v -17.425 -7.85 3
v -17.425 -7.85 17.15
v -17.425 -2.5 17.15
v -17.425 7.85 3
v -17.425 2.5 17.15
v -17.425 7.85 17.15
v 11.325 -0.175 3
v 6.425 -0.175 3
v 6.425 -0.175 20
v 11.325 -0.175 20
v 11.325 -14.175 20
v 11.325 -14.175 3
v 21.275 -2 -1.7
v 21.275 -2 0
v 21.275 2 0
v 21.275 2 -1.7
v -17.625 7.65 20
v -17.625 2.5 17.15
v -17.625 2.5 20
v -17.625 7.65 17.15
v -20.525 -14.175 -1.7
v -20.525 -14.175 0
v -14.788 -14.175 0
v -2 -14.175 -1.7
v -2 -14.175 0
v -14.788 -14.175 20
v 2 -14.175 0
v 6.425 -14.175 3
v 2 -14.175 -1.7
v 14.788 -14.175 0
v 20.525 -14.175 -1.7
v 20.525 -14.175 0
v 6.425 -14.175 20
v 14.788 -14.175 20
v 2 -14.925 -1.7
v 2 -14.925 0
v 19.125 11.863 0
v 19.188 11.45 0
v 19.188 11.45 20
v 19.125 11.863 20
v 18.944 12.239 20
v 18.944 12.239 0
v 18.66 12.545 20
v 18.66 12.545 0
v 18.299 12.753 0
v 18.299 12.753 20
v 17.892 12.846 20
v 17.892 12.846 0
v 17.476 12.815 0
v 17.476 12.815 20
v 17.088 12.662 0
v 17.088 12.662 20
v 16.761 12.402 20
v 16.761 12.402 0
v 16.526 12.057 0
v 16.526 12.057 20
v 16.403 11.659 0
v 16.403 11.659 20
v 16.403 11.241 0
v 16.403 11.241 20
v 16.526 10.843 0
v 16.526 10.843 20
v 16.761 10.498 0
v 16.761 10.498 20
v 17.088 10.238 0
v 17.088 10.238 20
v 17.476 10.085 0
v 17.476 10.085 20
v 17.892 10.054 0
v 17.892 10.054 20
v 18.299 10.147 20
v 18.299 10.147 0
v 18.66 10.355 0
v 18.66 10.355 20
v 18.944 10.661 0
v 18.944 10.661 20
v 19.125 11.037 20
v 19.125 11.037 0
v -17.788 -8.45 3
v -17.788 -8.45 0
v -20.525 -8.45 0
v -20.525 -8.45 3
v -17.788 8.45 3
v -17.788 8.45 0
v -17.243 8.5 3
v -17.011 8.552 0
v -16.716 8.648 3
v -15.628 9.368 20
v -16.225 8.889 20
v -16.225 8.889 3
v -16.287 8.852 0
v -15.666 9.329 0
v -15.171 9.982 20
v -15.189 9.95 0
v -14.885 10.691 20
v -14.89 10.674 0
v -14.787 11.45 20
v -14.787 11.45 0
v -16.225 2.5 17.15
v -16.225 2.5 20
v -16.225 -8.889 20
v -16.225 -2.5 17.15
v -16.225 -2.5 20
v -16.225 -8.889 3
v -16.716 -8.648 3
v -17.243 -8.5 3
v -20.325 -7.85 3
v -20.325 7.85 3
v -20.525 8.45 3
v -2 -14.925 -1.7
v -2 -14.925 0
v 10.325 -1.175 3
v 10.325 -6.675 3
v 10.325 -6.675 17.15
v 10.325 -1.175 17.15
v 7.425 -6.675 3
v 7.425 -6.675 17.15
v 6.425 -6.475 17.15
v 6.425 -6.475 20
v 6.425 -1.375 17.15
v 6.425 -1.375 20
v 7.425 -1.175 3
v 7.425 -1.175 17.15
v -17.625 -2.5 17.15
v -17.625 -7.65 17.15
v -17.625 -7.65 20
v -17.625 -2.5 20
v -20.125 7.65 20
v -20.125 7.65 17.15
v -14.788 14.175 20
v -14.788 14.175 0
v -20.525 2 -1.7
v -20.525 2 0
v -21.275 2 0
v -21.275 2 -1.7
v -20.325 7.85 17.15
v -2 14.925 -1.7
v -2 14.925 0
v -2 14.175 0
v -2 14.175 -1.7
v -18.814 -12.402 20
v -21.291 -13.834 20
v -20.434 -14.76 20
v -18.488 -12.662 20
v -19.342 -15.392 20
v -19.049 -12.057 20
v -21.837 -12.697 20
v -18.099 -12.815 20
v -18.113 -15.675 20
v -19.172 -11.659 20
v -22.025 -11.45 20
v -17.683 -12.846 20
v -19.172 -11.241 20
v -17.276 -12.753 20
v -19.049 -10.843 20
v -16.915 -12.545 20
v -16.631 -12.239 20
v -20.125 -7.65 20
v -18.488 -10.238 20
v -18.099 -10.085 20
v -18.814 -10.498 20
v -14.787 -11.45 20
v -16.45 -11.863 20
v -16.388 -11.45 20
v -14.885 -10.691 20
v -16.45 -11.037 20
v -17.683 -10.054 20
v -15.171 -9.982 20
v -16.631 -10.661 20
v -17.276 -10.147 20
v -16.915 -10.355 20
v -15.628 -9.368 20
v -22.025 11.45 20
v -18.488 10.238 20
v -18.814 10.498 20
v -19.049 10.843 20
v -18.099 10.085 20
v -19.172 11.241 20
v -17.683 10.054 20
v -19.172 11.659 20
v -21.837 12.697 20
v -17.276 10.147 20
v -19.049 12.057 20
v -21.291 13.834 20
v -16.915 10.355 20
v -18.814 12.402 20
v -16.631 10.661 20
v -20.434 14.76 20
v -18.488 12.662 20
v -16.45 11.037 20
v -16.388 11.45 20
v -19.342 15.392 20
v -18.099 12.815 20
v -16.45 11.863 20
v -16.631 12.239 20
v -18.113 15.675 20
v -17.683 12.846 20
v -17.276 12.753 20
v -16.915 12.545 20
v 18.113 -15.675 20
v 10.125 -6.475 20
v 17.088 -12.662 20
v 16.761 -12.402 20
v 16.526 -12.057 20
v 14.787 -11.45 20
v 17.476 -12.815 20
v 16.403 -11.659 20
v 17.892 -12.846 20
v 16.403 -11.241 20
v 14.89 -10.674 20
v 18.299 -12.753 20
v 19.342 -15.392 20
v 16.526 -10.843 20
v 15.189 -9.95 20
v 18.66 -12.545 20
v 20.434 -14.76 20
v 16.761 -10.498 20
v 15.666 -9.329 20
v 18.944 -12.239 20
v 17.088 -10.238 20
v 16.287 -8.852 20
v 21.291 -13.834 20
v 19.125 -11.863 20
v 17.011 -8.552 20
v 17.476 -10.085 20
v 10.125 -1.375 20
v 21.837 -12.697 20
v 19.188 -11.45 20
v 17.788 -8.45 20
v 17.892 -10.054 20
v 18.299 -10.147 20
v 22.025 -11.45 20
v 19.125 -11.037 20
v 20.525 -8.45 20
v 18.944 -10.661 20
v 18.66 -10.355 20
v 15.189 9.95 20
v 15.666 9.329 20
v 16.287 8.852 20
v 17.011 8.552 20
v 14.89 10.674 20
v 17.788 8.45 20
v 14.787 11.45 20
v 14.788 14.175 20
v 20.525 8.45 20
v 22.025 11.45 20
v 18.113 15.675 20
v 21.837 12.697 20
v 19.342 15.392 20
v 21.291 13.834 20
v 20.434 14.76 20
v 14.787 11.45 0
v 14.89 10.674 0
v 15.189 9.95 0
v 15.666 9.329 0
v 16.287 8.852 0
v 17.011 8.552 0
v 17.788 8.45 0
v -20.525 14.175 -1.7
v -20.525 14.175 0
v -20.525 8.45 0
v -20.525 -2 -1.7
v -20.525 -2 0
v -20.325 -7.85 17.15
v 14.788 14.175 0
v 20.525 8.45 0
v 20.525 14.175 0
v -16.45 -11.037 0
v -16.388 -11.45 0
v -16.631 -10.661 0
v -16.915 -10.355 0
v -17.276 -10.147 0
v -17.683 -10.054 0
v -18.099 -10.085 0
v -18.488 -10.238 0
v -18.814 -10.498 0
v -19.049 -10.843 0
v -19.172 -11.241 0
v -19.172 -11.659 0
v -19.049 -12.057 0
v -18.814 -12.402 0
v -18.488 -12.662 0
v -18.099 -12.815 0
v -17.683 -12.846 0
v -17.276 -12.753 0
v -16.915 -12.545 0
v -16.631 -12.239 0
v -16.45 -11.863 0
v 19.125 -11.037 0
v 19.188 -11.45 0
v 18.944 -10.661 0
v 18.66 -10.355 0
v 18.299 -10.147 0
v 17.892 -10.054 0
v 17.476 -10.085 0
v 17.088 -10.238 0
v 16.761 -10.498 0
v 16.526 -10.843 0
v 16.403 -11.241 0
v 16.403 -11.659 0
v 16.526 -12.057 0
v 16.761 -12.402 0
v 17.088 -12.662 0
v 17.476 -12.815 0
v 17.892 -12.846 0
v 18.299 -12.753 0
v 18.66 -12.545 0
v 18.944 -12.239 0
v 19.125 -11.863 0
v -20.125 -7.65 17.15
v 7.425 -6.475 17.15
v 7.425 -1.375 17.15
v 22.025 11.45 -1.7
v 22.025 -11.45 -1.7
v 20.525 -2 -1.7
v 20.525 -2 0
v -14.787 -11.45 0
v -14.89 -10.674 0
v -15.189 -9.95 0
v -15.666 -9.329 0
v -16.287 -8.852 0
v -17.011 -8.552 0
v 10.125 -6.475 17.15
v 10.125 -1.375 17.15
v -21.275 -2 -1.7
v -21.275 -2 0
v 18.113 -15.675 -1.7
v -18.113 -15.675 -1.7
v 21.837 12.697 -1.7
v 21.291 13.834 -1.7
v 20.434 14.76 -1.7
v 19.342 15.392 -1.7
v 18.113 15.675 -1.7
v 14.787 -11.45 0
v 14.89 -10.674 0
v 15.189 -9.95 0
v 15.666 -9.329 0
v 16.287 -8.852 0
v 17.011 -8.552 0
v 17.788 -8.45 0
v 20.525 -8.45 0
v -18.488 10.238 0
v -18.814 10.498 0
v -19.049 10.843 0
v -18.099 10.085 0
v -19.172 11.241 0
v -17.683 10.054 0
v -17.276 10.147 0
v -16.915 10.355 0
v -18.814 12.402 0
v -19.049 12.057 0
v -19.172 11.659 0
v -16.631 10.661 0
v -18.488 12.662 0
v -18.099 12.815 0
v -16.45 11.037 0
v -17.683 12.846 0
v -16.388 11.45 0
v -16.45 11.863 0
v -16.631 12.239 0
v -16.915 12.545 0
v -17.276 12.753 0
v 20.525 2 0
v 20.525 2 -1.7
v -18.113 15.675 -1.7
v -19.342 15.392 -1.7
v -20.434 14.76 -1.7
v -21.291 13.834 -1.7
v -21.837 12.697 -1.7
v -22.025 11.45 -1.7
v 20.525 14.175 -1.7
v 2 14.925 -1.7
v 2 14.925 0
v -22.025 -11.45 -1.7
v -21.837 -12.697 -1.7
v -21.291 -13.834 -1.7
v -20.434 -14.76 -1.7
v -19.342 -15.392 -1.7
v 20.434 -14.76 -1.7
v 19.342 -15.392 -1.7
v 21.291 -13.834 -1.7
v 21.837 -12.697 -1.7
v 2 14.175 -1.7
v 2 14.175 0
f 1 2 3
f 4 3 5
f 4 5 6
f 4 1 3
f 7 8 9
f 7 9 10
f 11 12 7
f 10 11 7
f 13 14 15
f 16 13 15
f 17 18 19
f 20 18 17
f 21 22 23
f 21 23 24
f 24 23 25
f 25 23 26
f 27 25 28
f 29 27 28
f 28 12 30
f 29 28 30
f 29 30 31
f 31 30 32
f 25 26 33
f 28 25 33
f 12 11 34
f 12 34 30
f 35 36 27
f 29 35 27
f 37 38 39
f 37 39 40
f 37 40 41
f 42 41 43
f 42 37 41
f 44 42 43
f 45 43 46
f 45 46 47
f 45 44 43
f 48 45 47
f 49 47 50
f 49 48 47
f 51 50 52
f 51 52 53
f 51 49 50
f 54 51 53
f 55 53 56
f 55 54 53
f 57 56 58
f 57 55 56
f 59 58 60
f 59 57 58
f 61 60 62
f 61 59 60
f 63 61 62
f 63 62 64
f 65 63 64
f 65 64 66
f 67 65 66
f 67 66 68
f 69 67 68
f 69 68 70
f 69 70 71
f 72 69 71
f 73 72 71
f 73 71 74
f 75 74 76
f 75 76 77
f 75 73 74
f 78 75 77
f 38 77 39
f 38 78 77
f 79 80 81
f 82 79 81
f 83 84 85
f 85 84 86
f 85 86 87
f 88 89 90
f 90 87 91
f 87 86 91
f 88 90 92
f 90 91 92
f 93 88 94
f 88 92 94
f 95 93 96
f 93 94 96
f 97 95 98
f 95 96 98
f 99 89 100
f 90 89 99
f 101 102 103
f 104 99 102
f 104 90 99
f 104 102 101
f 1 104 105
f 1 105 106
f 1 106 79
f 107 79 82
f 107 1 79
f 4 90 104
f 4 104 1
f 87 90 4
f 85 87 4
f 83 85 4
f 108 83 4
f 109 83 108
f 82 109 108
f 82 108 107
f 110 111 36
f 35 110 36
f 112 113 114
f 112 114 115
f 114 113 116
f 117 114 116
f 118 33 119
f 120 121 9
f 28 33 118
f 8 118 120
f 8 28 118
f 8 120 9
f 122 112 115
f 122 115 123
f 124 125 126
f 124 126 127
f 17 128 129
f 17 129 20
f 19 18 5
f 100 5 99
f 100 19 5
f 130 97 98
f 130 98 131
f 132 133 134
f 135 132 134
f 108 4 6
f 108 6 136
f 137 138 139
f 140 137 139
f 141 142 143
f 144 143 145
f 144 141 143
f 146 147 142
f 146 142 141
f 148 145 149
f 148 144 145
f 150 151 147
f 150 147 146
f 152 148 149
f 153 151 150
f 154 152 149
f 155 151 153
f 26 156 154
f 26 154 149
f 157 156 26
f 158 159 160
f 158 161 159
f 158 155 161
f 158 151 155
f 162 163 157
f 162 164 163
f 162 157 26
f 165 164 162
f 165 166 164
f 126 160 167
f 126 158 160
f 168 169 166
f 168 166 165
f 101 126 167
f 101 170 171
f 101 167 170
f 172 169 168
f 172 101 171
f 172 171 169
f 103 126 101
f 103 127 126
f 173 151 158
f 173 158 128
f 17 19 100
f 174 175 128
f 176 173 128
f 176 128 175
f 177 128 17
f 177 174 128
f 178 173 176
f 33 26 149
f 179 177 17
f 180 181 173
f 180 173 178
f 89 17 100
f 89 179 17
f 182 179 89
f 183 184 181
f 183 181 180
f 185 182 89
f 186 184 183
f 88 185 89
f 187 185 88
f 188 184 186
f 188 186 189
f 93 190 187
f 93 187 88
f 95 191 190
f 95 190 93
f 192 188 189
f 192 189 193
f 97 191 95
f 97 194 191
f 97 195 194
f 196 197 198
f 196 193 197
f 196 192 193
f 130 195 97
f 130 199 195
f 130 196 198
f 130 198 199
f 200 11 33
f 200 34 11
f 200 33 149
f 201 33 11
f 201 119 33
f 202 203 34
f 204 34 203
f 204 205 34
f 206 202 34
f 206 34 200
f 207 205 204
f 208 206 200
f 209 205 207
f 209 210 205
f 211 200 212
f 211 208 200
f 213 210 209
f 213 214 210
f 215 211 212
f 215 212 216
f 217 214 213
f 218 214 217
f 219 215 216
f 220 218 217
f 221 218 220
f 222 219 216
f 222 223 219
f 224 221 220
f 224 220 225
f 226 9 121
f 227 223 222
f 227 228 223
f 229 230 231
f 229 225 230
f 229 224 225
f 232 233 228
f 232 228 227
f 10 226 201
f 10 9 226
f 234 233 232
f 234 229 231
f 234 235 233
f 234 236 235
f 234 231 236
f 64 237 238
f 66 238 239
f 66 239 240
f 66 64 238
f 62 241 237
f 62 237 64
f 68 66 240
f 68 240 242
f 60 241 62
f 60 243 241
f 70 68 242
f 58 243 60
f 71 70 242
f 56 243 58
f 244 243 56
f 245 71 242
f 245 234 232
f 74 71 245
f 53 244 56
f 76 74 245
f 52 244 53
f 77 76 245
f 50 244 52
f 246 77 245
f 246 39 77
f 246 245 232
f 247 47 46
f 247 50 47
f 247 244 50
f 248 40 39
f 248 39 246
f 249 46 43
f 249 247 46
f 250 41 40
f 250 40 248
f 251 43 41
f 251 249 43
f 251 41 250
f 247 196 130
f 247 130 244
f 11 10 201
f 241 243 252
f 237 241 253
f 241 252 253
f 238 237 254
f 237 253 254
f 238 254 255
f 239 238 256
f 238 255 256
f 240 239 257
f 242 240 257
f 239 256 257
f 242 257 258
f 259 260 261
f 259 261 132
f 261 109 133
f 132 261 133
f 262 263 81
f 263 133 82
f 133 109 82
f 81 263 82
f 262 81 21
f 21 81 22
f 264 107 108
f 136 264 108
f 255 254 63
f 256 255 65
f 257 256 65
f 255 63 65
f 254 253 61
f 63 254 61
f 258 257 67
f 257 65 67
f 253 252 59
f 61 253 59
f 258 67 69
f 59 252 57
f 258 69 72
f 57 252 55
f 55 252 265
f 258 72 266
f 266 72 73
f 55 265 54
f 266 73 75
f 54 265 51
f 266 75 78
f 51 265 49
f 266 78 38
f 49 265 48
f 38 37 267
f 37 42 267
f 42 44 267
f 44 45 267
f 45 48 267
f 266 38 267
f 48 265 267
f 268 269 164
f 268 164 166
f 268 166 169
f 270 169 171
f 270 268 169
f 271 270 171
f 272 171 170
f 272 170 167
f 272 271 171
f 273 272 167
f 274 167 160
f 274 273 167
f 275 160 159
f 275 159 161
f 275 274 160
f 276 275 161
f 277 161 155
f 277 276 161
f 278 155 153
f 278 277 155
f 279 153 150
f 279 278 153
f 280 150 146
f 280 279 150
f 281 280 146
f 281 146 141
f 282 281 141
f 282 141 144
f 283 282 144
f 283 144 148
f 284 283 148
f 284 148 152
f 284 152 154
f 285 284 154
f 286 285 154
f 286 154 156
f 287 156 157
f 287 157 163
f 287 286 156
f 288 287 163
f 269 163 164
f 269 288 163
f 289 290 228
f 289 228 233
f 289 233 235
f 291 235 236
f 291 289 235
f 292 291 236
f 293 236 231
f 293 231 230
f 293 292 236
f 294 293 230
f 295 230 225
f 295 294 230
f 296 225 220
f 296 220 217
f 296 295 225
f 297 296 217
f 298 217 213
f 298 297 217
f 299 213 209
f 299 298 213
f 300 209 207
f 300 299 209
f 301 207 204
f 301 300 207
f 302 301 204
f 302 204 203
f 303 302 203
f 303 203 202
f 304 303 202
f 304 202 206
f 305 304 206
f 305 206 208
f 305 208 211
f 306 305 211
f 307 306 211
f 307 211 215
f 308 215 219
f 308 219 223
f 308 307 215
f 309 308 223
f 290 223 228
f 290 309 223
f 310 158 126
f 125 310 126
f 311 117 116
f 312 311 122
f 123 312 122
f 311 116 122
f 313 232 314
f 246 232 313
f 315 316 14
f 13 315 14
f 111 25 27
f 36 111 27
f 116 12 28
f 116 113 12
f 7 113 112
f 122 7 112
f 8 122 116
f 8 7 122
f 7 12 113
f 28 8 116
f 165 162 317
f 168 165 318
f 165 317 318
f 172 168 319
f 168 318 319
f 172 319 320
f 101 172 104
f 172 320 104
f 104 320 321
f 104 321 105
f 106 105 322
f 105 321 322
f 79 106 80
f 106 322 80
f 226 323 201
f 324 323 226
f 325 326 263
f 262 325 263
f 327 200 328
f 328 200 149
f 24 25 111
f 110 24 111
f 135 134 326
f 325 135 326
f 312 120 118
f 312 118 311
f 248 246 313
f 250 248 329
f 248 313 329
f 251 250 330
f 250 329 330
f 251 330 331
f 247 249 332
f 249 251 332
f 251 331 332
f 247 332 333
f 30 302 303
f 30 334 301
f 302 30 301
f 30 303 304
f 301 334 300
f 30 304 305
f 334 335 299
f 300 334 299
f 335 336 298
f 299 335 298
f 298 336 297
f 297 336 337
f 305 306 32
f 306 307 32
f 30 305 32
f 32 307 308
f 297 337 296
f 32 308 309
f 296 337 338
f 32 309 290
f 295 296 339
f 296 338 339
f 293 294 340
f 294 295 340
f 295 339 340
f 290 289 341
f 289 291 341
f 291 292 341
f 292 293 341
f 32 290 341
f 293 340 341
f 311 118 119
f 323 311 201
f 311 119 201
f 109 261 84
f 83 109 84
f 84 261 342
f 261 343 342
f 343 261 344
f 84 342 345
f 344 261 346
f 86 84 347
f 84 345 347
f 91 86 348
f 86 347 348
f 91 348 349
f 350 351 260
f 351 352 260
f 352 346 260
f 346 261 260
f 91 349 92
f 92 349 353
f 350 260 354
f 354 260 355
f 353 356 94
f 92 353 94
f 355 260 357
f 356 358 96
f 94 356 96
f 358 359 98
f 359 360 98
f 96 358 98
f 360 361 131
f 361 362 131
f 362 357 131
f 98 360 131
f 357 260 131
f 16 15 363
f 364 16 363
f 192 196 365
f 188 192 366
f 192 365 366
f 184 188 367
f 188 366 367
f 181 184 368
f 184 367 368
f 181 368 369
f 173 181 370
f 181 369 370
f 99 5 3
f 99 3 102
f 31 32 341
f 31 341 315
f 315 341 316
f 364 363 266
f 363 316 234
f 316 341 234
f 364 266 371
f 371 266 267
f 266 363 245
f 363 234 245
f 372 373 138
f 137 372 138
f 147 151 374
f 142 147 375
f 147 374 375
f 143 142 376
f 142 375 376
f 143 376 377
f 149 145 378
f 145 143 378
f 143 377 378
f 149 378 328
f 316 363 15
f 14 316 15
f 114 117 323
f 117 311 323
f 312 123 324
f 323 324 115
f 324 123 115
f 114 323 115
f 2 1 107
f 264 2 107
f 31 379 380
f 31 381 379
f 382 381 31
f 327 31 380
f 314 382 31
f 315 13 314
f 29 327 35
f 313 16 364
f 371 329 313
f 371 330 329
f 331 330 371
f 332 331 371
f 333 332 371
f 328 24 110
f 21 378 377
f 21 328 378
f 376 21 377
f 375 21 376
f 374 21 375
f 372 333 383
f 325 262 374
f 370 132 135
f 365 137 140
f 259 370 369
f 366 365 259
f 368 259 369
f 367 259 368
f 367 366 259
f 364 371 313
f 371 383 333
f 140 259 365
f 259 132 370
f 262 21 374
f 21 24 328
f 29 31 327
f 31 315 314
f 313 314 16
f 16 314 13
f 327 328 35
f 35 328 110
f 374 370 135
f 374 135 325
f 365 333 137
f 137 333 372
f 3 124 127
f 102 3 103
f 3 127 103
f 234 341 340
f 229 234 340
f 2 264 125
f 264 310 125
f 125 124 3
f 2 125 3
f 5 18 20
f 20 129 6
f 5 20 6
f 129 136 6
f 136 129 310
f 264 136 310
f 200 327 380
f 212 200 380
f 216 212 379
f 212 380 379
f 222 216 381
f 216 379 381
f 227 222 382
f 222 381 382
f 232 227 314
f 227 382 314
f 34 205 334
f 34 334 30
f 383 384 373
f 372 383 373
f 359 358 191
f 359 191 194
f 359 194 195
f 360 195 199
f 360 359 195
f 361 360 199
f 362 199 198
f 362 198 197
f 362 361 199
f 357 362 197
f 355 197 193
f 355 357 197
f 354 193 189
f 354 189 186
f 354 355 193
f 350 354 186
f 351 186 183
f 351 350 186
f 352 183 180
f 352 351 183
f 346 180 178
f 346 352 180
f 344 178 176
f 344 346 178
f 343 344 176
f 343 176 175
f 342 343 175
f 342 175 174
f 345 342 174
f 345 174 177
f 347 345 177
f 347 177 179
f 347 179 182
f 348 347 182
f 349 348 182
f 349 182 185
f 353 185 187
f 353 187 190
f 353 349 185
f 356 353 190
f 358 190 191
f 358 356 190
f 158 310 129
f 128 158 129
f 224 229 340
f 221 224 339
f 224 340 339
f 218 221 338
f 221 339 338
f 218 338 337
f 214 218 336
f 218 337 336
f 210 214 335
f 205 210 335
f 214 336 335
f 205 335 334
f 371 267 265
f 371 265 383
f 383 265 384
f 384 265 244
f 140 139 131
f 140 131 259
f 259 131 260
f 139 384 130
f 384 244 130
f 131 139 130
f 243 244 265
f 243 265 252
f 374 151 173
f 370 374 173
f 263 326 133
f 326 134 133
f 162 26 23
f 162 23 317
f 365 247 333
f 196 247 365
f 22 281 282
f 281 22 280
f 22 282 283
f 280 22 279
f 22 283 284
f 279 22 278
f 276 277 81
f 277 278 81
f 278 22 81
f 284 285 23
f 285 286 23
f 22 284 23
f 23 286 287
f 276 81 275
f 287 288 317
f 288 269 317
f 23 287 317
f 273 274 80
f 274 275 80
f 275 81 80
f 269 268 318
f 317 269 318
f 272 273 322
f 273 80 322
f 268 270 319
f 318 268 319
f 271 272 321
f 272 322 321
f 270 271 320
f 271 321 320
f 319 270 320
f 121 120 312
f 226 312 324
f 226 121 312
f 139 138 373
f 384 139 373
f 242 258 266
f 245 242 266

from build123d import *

# Parameters (mm, degrees)
SKETCH1_W           = 44.05
SKETCH1_H           = 31.35
SKETCH1_R           = 1.4
BOSS_EXTRUDE1_DEPTH = 20
SKETCH2_W           = 44.05
SKETCH2_H           = 31.35
BOSS_EXTRUDE2_DEPTH = 1.7
SKETCH3_W           = 2.9
SKETCH3_H           = 15.7
SKETCH3_W_2         = 4.9
SKETCH3_H_2         = 14
SKETCH3_H_3         = 5.5
BOSS_EXTRUDE3_DEPTH = 14.15
SKETCH4_W           = 4.9
SKETCH4_H           = 14
SKETCH4_W_2         = 2.5
SKETCH4_H_2         = 5.1
SKETCH4_H_3         = 15.3
BOSS_EXTRUDE4_DEPTH = 2.85
SKETCH5_W           = 1.4
SKETCH5_H           = 5
SKETCH5_W_2         = 1.2
SKETCH5_H_2         = 5.1
CUT_EXTRUDE1_DEPTH  = 2.85
CUT_EXTRUDE2_REACH  = 23.7


with BuildPart() as part:
    # Sketch1 → Boss-Extrude1 (new body)
    with BuildSketch(Plane.XY):
        Rectangle(SKETCH1_W, SKETCH1_H)
        with Locations((-17.7875, -11.45)):
            Circle(SKETCH1_R, mode=Mode.SUBTRACT)
        with Locations((17.7875, -11.45)):
            Circle(SKETCH1_R, mode=Mode.SUBTRACT)
        with BuildLine():
            Line((-17.7875, -8.45), (-20.525, -8.45))
            Line((-20.525, -8.45), (-20.525, 8.45))
            Line((-20.525, 8.45), (-17.7875, 8.45))
            ThreePointArc((-17.7875, 8.45), (-15.666179656, 9.328679656), (-14.7875, 11.45))
            Line((-14.7875, 11.45), (-14.7875, 14.175))
            Line((-14.7875, 14.175), (14.7875, 14.175))
            Line((14.7875, 14.175), (14.7875, 11.45))
            ThreePointArc((14.7875, 11.45), (15.666179656, 9.328679656), (17.7875, 8.45))
            Line((17.7875, 8.45), (20.525, 8.45))
            Line((20.525, 8.45), (20.525, -8.45))
            Line((20.525, -8.45), (17.7875, -8.45))
            ThreePointArc((17.7875, -8.45), (15.666179656, -9.328679656), (14.7875, -11.45))
            Line((14.7875, -11.45), (14.7875, -14.175))
            Line((14.7875, -14.175), (-14.7875, -14.175))
            Line((-14.7875, -14.175), (-14.7875, -11.45))
            ThreePointArc((-14.7875, -11.45), (-15.666179656, -9.328679656), (-17.7875, -8.45))
        make_face(mode=Mode.SUBTRACT)
        with Locations((-17.7875, 11.45)):
            Circle(SKETCH1_R, mode=Mode.SUBTRACT)
        with Locations((17.7875, 11.45)):
            Circle(SKETCH1_R, mode=Mode.SUBTRACT)
    extrude(amount=BOSS_EXTRUDE1_DEPTH)

    # Sketch2 → Boss-Extrude2 (add)
    with BuildSketch(Plane(origin=(0, 0, 0), x_dir=(-1, 0, 0), z_dir=(0, 0, -1))):
        Rectangle(SKETCH2_W, SKETCH2_H)
        Polygon((-20.525, 8.45), (-20.525, 14.175), (-14.7875, 14.175), (-2, 14.175), (-2, 14.925), (2, 14.925), (2, 14.175), (14.7875, 14.175), (20.525, 14.175), (20.525, 8.45), (20.525, 2), (21.275, 2), (21.275, -2), (20.525, -2), (20.525, -8.45), (20.525, -14.175), (14.7875, -14.175), (2, -14.175), (2, -14.925), (-2, -14.925), (-2, -14.175), (-14.7875, -14.175), (-20.525, -14.175), (-20.525, -8.45), (-20.525, -2), (-21.275, -2), (-21.275, 2), (-20.525, 2), align=None, mode=Mode.SUBTRACT)
    extrude(amount=BOSS_EXTRUDE2_DEPTH)

    # Sketch3 → Boss-Extrude3 (add)
    with BuildSketch(Plane(origin=(0, 0, 3), x_dir=(-1, 0, 0), z_dir=(0, 0, -1))):
        with BuildLine():
            ThreePointArc((16.225, -8.889024844), (16.975996909, -8.561840944), (17.7875, -8.45))
            Line((17.7875, -8.45), (20.525, -8.45))
            Line((20.525, -8.45), (20.525, 8.45))
            Line((20.525, 8.45), (17.7875, 8.45))
            ThreePointArc((17.7875, 8.45), (16.975996909, 8.561840944), (16.225, 8.889024844))
            Line((16.225, 8.889024844), (16.225, -8.889024844))
        make_face()
        with Locations((18.875, 0)):
            Rectangle(SKETCH3_W, SKETCH3_H, mode=Mode.SUBTRACT)
        with Locations((-8.875, -7.175)):
            Rectangle(SKETCH3_W_2, SKETCH3_H_2)
        with Locations((-8.875, -3.925)):
            Rectangle(SKETCH3_W, SKETCH3_H_3, mode=Mode.SUBTRACT)
    extrude(amount=-BOSS_EXTRUDE3_DEPTH)

    # Sketch4 → Boss-Extrude4 (add)
    with BuildSketch(Plane.XY.offset(17.15)):
        with Locations((8.875, -7.175)):
            Rectangle(SKETCH4_W, SKETCH4_H)
        with Locations((8.875, -3.925)):
            Rectangle(SKETCH4_W_2, SKETCH4_H_2, mode=Mode.SUBTRACT)
        with BuildLine():
            Line((-20.525, -8.45), (-17.7875, -8.45))
            ThreePointArc((-17.7875, -8.45), (-16.975996909, -8.561840944), (-16.225, -8.889024844))
            Line((-16.225, -8.889024844), (-16.225, 8.889024844))
            ThreePointArc((-16.225, 8.889024844), (-16.975996909, 8.561840944), (-17.7875, 8.45))
            Line((-17.7875, 8.45), (-20.525, 8.45))
            Line((-20.525, 8.45), (-20.525, -8.45))
        make_face()
        with Locations((-18.875, 0)):
            Rectangle(SKETCH4_W_2, SKETCH4_H_3, mode=Mode.SUBTRACT)
    extrude(amount=BOSS_EXTRUDE4_DEPTH)

    # Sketch5 → Cut-Extrude1 (cut)
    with BuildSketch(Plane.XY.offset(20)):
        with Locations((-16.925, 0)):
            Rectangle(SKETCH5_W, SKETCH5_H)
        with Locations((7.025, -3.925)):
            Rectangle(SKETCH5_W_2, SKETCH5_H_2)
    extrude(amount=-CUT_EXTRUDE1_DEPTH, mode=Mode.SUBTRACT)

    # Sketch6 → Cut-Extrude2 (cut, up to next)
    with BuildSketch(Plane(origin=(0, 0, -1.7), x_dir=(-1, 0, 0), z_dir=(0, 0, -1)), mode=Mode.PRIVATE) as cut_extrude2_sk1:
        with BuildLine():
            Line((-18.112740296, 15.675), (-22.025, 15.675))
            Line((-22.025, 15.675), (-22.025, 11.45))
            ThreePointArc((-22.025, 11.45), (-20.896729165, 14.329079757), (-18.112740296, 15.675))
        make_face()
    cut_extrude2_tool1 = extrude(cut_extrude2_sk1.sketch, amount=-CUT_EXTRUDE2_REACH, mode=Mode.PRIVATE) & part.part
    add(cut_extrude2_tool1.solids().sort_by_distance((21.092545, 14.728552, -1.7))[0], mode=Mode.SUBTRACT)
    # Sketch6 → Cut-Extrude2 (cut, up to next)
    with BuildSketch(Plane(origin=(0, 0, -1.7), x_dir=(-1, 0, 0), z_dir=(0, 0, -1)), mode=Mode.PRIVATE) as cut_extrude2_sk2:
        with BuildLine():
            Line((22.025, 15.675), (18.112740296, 15.675))
            ThreePointArc((18.112740296, 15.675), (20.896729165, 14.329079757), (22.025, 11.45))
            Line((22.025, 11.45), (22.025, 15.675))
        make_face()
    cut_extrude2_tool2 = extrude(cut_extrude2_sk2.sketch, amount=-CUT_EXTRUDE2_REACH, mode=Mode.PRIVATE) & part.part
    add(cut_extrude2_tool2.solids().sort_by_distance((-21.092545, 14.728552, -1.7))[0], mode=Mode.SUBTRACT)
    # Sketch6 → Cut-Extrude2 (cut, up to next)
    with BuildSketch(Plane(origin=(0, 0, -1.7), x_dir=(-1, 0, 0), z_dir=(0, 0, -1)), mode=Mode.PRIVATE) as cut_extrude2_sk3:
        with BuildLine():
            Line((22.025, -15.675), (22.025, -11.45))
            ThreePointArc((22.025, -11.45), (20.896729165, -14.329079757), (18.112740296, -15.675))
            Line((18.112740296, -15.675), (22.025, -15.675))
        make_face()
    cut_extrude2_tool3 = extrude(cut_extrude2_sk3.sketch, amount=-CUT_EXTRUDE2_REACH, mode=Mode.PRIVATE) & part.part
    add(cut_extrude2_tool3.solids().sort_by_distance((-21.092545, -14.728552, -1.7))[0], mode=Mode.SUBTRACT)
    # Sketch6 → Cut-Extrude2 (cut, up to next)
    with BuildSketch(Plane(origin=(0, 0, -1.7), x_dir=(-1, 0, 0), z_dir=(0, 0, -1)), mode=Mode.PRIVATE) as cut_extrude2_sk4:
        with BuildLine():
            ThreePointArc((-18.112740296, -15.675), (-20.896729167, -14.329079755), (-22.025, -11.449999993))
            Line((-22.025, -11.449999993), (-22.025, -15.675))
            Line((-22.025, -15.675), (-18.112740296, -15.675))
        make_face()
    cut_extrude2_tool4 = extrude(cut_extrude2_sk4.sketch, amount=-CUT_EXTRUDE2_REACH, mode=Mode.PRIVATE) & part.part
    add(cut_extrude2_tool4.solids().sort_by_distance((21.092545, -14.728552, -1.7))[0], mode=Mode.SUBTRACT)


solid = part.part
